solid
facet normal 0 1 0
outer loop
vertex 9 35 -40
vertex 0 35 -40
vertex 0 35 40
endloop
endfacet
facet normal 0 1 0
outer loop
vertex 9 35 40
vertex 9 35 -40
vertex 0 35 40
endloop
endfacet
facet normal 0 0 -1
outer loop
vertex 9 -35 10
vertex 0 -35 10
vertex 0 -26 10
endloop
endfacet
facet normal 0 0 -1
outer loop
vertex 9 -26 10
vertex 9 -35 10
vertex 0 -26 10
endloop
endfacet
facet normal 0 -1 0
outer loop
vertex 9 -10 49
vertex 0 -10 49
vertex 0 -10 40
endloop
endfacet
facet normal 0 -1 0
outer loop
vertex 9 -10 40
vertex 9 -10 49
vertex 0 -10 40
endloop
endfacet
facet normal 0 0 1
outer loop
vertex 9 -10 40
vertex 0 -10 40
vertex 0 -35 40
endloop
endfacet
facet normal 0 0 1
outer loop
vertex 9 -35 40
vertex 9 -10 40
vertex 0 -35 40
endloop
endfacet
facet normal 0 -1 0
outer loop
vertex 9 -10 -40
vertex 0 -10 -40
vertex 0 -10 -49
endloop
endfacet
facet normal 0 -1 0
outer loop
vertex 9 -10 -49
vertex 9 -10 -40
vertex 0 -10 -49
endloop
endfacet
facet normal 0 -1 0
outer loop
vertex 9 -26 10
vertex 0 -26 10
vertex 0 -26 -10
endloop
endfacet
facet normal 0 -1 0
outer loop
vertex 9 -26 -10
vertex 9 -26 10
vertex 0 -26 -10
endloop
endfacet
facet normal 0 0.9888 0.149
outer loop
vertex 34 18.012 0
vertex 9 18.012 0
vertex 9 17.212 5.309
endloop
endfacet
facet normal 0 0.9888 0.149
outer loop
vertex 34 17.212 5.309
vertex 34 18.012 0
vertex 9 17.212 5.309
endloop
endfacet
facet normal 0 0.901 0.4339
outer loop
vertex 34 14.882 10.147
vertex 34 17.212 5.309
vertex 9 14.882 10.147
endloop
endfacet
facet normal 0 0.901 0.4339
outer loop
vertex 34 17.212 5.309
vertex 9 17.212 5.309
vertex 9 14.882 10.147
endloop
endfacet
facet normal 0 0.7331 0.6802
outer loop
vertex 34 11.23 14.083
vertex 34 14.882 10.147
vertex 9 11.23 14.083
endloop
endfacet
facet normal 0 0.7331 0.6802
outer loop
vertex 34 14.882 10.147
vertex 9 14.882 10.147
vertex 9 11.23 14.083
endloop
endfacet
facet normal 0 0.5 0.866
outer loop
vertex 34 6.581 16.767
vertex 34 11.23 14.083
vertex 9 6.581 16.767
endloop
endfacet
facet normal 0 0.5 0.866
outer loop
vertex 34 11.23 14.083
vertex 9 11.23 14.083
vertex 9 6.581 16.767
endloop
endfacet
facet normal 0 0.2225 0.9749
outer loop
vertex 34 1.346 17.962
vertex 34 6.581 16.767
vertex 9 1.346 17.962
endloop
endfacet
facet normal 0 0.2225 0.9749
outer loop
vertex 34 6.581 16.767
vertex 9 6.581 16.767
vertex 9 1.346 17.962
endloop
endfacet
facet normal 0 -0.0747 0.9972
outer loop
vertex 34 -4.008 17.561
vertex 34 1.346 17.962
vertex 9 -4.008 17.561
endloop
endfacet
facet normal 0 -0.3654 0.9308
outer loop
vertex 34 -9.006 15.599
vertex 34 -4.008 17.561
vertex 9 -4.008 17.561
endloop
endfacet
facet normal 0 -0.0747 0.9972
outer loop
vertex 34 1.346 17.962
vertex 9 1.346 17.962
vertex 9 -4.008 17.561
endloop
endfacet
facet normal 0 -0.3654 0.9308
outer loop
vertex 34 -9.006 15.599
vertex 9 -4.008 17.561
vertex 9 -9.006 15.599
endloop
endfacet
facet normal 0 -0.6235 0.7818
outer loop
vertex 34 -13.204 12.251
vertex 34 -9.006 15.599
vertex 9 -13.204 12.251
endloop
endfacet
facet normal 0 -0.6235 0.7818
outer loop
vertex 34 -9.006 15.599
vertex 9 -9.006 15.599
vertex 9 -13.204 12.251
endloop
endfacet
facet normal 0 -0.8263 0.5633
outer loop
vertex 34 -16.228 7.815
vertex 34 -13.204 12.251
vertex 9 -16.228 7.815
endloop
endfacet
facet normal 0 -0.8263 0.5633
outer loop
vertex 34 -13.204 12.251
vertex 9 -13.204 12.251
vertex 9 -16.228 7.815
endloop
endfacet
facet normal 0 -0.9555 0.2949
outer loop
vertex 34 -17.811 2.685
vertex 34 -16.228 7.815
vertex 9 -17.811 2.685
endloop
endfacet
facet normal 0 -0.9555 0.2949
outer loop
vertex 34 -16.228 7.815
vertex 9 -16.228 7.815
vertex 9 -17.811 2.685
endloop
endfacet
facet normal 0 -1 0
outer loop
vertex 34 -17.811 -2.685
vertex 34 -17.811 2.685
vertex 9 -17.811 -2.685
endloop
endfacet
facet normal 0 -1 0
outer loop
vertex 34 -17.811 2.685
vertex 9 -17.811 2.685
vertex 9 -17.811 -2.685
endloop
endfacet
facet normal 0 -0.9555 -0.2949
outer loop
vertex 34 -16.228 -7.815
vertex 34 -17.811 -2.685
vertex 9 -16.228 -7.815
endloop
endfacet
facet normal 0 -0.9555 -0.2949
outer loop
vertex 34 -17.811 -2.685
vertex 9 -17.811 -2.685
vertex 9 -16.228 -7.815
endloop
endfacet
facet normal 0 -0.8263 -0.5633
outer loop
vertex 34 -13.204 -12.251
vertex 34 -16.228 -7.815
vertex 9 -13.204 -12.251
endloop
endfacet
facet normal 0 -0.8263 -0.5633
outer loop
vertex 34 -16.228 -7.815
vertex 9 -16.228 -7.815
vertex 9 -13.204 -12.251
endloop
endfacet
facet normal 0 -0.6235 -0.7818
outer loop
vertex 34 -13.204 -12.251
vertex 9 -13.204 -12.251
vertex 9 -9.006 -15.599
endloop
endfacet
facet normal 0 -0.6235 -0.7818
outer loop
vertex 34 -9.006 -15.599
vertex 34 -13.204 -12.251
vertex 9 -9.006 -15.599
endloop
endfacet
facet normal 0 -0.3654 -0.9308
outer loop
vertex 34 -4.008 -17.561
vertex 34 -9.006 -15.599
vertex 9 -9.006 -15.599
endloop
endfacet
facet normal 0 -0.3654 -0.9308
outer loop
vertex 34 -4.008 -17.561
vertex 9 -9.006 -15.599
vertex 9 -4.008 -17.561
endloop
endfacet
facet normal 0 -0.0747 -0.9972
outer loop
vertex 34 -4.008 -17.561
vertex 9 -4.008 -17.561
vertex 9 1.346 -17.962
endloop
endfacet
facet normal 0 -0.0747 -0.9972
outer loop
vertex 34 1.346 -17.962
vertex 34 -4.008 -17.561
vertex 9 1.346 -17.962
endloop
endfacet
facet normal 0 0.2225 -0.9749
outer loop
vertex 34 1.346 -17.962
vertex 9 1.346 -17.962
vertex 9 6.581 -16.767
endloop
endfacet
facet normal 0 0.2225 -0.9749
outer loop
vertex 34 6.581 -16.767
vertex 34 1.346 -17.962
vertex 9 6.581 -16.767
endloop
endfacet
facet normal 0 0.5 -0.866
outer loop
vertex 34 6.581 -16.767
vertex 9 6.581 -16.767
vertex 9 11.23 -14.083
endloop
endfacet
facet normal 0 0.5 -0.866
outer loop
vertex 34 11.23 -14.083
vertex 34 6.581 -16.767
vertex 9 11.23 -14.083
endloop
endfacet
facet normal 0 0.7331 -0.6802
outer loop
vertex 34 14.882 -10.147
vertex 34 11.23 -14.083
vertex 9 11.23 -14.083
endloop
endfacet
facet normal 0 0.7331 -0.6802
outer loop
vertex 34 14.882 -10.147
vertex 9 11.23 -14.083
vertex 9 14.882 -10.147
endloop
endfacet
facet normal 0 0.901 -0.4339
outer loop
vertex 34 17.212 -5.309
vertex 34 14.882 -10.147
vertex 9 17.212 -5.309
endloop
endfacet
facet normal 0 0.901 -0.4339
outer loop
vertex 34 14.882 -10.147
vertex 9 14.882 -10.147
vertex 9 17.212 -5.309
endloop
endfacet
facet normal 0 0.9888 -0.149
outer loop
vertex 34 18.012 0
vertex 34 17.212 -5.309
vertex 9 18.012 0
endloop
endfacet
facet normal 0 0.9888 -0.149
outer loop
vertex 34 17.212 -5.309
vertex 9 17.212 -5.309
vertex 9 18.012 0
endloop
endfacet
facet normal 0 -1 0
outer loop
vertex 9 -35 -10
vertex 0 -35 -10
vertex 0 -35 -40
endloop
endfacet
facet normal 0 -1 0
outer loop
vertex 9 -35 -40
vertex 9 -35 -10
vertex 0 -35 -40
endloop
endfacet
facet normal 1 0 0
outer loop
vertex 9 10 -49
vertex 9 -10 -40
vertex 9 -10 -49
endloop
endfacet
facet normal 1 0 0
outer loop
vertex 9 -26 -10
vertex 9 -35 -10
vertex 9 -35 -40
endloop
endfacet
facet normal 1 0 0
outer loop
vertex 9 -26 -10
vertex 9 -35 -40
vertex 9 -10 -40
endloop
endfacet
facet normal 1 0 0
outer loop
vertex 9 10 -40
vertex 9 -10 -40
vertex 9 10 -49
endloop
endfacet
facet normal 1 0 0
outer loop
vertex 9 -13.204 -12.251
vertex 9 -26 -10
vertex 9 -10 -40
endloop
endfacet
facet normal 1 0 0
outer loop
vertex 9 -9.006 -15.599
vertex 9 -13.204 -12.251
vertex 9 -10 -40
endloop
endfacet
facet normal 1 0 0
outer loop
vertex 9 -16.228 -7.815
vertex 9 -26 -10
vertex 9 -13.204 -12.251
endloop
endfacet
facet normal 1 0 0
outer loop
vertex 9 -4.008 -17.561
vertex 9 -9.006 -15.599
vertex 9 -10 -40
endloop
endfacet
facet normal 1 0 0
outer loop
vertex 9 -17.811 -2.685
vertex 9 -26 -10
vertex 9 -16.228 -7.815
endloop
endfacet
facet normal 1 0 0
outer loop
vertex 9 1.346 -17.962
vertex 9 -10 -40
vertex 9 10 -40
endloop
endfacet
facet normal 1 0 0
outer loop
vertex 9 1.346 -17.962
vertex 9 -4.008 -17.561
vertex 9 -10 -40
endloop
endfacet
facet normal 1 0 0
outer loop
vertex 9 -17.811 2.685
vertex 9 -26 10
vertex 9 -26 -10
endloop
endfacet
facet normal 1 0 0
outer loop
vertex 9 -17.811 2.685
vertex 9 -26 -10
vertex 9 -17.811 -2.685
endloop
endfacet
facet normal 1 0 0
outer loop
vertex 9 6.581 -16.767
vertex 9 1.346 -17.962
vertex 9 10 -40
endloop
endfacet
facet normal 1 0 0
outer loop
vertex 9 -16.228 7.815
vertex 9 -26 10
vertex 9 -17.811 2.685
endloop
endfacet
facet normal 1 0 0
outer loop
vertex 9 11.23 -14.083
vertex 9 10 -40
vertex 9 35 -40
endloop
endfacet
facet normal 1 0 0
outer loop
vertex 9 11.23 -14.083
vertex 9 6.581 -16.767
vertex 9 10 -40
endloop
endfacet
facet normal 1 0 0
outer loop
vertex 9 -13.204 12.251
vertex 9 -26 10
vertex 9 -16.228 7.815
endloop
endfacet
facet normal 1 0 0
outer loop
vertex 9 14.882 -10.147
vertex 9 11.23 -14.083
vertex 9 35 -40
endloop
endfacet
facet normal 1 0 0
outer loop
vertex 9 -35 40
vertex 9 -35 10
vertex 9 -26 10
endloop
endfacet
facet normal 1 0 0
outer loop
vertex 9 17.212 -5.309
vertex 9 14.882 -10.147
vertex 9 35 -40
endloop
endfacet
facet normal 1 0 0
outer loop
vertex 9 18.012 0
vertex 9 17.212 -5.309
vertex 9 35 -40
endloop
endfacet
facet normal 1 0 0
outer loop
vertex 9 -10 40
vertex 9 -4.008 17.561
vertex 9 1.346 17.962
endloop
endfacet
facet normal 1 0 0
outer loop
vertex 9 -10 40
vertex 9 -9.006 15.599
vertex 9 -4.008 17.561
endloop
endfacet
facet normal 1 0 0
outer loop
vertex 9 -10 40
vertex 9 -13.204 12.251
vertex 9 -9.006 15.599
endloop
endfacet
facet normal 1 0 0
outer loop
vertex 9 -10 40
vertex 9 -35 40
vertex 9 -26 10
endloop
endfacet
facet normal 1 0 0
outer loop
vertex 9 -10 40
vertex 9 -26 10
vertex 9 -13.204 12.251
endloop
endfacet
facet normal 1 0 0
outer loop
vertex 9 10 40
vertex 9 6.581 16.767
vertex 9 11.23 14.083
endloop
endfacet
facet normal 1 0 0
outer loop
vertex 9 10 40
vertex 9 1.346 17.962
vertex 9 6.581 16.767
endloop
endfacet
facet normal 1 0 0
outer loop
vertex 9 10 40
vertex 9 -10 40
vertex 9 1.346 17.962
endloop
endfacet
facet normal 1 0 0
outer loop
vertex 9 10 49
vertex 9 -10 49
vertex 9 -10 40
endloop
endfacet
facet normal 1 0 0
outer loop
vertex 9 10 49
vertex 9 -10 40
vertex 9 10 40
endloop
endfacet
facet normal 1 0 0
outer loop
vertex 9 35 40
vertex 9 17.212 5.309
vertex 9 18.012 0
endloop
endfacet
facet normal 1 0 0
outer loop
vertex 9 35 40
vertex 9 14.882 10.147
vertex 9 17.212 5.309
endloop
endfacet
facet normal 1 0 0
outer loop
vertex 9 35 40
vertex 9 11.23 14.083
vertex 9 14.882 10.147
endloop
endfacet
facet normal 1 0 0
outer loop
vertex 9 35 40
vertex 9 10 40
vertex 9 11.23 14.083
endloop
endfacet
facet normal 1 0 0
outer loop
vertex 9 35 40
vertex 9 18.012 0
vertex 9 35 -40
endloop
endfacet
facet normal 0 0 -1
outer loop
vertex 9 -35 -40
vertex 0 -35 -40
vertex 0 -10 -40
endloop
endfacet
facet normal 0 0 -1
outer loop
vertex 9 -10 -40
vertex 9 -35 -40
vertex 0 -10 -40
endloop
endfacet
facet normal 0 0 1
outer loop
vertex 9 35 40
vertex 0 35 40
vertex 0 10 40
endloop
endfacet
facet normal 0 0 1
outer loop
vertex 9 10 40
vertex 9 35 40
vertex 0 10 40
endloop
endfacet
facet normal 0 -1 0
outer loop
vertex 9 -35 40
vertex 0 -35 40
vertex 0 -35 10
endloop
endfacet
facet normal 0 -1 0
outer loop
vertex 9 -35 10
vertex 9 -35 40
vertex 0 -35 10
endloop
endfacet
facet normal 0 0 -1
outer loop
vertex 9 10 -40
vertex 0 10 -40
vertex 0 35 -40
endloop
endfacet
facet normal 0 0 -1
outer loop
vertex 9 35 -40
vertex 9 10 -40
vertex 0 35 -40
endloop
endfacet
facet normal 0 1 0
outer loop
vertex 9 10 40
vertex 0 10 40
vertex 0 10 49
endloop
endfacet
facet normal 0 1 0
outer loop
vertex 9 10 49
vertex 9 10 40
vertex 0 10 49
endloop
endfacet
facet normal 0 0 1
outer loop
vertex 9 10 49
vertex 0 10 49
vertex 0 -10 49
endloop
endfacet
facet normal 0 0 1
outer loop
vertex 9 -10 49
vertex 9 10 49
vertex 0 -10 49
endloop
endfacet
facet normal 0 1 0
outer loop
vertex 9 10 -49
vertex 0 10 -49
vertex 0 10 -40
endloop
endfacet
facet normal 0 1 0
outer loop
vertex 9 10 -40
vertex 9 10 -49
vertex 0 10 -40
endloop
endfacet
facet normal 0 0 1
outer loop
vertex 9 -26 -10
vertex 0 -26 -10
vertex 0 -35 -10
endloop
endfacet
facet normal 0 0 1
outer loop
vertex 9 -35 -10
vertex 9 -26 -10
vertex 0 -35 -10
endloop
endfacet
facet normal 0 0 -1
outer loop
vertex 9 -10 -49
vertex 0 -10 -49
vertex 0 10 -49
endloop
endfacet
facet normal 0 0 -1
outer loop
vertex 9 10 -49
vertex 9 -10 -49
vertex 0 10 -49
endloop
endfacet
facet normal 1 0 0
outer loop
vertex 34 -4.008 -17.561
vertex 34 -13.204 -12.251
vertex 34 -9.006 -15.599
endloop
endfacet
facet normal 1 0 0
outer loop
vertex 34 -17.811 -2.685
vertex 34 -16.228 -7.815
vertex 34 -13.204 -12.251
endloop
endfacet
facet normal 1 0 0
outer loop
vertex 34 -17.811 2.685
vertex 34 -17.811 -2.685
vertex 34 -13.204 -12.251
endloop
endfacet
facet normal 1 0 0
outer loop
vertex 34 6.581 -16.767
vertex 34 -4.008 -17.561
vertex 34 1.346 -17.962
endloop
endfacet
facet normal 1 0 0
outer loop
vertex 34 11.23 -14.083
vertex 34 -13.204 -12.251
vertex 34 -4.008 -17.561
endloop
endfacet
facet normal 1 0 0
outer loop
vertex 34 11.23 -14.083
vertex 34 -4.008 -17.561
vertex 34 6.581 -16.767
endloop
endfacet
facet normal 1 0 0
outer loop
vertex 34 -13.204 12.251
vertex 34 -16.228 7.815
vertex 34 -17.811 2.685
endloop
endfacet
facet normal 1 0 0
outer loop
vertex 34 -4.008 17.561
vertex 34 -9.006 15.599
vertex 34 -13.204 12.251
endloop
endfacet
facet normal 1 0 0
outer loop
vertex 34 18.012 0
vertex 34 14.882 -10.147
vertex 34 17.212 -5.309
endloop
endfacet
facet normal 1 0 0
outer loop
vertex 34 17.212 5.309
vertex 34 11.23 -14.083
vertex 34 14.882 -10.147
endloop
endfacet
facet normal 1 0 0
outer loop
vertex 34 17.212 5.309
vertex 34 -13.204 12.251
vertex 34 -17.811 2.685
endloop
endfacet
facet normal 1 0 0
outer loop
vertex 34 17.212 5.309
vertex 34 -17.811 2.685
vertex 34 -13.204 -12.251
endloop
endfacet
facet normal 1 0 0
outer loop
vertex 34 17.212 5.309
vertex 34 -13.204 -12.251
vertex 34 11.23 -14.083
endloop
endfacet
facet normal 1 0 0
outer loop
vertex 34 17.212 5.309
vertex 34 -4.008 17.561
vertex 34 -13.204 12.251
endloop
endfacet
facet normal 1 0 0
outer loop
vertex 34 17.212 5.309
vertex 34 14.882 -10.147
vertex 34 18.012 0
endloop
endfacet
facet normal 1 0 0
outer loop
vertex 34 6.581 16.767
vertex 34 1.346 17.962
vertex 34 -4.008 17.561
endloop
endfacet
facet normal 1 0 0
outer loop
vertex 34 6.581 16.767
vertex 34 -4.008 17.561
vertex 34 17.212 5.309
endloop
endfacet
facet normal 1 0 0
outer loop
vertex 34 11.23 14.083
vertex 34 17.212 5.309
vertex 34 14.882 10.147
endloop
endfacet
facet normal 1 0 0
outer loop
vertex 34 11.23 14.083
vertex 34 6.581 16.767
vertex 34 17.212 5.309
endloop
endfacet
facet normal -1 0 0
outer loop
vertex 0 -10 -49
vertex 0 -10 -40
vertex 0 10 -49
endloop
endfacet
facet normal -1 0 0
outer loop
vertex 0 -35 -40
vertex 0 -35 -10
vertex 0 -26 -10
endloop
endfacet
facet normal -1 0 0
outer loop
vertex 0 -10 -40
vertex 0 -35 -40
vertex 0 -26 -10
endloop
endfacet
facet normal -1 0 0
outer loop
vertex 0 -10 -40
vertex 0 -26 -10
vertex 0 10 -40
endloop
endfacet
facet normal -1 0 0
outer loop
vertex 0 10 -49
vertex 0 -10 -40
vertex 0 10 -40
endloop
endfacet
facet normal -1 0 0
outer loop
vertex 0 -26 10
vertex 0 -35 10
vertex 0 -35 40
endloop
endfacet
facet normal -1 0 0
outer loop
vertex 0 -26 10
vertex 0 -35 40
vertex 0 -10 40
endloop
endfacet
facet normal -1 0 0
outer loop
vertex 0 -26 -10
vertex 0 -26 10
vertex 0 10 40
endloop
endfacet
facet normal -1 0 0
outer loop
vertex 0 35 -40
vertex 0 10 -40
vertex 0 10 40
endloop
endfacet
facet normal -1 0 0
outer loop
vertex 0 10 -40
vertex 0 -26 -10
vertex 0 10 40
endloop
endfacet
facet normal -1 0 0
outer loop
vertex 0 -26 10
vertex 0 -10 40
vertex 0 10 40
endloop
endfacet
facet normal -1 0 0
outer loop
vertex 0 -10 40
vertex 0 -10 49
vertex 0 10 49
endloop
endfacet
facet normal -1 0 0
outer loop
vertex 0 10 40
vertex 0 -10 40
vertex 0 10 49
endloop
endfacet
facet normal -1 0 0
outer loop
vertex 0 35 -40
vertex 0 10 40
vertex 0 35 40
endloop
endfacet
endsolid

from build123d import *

# Parameters (mm, degrees)
F1_DEPTH = 9
F2_R     = 18.012252
F3_DEPTH = 25


with BuildPart() as f1:
    # F0 (on Right) → F1 (new body)
    with BuildSketch(Plane.YZ):
        Polygon((10, 40), (10, 49), (-10, 49), (-10, 40), (-35, 40), (-35, 10), (-26, 10), (-26, -10), (-35, -10), (-35, -40), (-10, -40), (-10, -49), (10, -49), (10, -40), (35, -40), (35, 40), align=None)
    extrude(amount=F1_DEPTH)

    # F2 (on face) → F3 (join)
    with BuildSketch(Plane.YZ.offset(9)):
        Circle(F2_R)
    extrude(amount=F3_DEPTH)


solid = f1.part
